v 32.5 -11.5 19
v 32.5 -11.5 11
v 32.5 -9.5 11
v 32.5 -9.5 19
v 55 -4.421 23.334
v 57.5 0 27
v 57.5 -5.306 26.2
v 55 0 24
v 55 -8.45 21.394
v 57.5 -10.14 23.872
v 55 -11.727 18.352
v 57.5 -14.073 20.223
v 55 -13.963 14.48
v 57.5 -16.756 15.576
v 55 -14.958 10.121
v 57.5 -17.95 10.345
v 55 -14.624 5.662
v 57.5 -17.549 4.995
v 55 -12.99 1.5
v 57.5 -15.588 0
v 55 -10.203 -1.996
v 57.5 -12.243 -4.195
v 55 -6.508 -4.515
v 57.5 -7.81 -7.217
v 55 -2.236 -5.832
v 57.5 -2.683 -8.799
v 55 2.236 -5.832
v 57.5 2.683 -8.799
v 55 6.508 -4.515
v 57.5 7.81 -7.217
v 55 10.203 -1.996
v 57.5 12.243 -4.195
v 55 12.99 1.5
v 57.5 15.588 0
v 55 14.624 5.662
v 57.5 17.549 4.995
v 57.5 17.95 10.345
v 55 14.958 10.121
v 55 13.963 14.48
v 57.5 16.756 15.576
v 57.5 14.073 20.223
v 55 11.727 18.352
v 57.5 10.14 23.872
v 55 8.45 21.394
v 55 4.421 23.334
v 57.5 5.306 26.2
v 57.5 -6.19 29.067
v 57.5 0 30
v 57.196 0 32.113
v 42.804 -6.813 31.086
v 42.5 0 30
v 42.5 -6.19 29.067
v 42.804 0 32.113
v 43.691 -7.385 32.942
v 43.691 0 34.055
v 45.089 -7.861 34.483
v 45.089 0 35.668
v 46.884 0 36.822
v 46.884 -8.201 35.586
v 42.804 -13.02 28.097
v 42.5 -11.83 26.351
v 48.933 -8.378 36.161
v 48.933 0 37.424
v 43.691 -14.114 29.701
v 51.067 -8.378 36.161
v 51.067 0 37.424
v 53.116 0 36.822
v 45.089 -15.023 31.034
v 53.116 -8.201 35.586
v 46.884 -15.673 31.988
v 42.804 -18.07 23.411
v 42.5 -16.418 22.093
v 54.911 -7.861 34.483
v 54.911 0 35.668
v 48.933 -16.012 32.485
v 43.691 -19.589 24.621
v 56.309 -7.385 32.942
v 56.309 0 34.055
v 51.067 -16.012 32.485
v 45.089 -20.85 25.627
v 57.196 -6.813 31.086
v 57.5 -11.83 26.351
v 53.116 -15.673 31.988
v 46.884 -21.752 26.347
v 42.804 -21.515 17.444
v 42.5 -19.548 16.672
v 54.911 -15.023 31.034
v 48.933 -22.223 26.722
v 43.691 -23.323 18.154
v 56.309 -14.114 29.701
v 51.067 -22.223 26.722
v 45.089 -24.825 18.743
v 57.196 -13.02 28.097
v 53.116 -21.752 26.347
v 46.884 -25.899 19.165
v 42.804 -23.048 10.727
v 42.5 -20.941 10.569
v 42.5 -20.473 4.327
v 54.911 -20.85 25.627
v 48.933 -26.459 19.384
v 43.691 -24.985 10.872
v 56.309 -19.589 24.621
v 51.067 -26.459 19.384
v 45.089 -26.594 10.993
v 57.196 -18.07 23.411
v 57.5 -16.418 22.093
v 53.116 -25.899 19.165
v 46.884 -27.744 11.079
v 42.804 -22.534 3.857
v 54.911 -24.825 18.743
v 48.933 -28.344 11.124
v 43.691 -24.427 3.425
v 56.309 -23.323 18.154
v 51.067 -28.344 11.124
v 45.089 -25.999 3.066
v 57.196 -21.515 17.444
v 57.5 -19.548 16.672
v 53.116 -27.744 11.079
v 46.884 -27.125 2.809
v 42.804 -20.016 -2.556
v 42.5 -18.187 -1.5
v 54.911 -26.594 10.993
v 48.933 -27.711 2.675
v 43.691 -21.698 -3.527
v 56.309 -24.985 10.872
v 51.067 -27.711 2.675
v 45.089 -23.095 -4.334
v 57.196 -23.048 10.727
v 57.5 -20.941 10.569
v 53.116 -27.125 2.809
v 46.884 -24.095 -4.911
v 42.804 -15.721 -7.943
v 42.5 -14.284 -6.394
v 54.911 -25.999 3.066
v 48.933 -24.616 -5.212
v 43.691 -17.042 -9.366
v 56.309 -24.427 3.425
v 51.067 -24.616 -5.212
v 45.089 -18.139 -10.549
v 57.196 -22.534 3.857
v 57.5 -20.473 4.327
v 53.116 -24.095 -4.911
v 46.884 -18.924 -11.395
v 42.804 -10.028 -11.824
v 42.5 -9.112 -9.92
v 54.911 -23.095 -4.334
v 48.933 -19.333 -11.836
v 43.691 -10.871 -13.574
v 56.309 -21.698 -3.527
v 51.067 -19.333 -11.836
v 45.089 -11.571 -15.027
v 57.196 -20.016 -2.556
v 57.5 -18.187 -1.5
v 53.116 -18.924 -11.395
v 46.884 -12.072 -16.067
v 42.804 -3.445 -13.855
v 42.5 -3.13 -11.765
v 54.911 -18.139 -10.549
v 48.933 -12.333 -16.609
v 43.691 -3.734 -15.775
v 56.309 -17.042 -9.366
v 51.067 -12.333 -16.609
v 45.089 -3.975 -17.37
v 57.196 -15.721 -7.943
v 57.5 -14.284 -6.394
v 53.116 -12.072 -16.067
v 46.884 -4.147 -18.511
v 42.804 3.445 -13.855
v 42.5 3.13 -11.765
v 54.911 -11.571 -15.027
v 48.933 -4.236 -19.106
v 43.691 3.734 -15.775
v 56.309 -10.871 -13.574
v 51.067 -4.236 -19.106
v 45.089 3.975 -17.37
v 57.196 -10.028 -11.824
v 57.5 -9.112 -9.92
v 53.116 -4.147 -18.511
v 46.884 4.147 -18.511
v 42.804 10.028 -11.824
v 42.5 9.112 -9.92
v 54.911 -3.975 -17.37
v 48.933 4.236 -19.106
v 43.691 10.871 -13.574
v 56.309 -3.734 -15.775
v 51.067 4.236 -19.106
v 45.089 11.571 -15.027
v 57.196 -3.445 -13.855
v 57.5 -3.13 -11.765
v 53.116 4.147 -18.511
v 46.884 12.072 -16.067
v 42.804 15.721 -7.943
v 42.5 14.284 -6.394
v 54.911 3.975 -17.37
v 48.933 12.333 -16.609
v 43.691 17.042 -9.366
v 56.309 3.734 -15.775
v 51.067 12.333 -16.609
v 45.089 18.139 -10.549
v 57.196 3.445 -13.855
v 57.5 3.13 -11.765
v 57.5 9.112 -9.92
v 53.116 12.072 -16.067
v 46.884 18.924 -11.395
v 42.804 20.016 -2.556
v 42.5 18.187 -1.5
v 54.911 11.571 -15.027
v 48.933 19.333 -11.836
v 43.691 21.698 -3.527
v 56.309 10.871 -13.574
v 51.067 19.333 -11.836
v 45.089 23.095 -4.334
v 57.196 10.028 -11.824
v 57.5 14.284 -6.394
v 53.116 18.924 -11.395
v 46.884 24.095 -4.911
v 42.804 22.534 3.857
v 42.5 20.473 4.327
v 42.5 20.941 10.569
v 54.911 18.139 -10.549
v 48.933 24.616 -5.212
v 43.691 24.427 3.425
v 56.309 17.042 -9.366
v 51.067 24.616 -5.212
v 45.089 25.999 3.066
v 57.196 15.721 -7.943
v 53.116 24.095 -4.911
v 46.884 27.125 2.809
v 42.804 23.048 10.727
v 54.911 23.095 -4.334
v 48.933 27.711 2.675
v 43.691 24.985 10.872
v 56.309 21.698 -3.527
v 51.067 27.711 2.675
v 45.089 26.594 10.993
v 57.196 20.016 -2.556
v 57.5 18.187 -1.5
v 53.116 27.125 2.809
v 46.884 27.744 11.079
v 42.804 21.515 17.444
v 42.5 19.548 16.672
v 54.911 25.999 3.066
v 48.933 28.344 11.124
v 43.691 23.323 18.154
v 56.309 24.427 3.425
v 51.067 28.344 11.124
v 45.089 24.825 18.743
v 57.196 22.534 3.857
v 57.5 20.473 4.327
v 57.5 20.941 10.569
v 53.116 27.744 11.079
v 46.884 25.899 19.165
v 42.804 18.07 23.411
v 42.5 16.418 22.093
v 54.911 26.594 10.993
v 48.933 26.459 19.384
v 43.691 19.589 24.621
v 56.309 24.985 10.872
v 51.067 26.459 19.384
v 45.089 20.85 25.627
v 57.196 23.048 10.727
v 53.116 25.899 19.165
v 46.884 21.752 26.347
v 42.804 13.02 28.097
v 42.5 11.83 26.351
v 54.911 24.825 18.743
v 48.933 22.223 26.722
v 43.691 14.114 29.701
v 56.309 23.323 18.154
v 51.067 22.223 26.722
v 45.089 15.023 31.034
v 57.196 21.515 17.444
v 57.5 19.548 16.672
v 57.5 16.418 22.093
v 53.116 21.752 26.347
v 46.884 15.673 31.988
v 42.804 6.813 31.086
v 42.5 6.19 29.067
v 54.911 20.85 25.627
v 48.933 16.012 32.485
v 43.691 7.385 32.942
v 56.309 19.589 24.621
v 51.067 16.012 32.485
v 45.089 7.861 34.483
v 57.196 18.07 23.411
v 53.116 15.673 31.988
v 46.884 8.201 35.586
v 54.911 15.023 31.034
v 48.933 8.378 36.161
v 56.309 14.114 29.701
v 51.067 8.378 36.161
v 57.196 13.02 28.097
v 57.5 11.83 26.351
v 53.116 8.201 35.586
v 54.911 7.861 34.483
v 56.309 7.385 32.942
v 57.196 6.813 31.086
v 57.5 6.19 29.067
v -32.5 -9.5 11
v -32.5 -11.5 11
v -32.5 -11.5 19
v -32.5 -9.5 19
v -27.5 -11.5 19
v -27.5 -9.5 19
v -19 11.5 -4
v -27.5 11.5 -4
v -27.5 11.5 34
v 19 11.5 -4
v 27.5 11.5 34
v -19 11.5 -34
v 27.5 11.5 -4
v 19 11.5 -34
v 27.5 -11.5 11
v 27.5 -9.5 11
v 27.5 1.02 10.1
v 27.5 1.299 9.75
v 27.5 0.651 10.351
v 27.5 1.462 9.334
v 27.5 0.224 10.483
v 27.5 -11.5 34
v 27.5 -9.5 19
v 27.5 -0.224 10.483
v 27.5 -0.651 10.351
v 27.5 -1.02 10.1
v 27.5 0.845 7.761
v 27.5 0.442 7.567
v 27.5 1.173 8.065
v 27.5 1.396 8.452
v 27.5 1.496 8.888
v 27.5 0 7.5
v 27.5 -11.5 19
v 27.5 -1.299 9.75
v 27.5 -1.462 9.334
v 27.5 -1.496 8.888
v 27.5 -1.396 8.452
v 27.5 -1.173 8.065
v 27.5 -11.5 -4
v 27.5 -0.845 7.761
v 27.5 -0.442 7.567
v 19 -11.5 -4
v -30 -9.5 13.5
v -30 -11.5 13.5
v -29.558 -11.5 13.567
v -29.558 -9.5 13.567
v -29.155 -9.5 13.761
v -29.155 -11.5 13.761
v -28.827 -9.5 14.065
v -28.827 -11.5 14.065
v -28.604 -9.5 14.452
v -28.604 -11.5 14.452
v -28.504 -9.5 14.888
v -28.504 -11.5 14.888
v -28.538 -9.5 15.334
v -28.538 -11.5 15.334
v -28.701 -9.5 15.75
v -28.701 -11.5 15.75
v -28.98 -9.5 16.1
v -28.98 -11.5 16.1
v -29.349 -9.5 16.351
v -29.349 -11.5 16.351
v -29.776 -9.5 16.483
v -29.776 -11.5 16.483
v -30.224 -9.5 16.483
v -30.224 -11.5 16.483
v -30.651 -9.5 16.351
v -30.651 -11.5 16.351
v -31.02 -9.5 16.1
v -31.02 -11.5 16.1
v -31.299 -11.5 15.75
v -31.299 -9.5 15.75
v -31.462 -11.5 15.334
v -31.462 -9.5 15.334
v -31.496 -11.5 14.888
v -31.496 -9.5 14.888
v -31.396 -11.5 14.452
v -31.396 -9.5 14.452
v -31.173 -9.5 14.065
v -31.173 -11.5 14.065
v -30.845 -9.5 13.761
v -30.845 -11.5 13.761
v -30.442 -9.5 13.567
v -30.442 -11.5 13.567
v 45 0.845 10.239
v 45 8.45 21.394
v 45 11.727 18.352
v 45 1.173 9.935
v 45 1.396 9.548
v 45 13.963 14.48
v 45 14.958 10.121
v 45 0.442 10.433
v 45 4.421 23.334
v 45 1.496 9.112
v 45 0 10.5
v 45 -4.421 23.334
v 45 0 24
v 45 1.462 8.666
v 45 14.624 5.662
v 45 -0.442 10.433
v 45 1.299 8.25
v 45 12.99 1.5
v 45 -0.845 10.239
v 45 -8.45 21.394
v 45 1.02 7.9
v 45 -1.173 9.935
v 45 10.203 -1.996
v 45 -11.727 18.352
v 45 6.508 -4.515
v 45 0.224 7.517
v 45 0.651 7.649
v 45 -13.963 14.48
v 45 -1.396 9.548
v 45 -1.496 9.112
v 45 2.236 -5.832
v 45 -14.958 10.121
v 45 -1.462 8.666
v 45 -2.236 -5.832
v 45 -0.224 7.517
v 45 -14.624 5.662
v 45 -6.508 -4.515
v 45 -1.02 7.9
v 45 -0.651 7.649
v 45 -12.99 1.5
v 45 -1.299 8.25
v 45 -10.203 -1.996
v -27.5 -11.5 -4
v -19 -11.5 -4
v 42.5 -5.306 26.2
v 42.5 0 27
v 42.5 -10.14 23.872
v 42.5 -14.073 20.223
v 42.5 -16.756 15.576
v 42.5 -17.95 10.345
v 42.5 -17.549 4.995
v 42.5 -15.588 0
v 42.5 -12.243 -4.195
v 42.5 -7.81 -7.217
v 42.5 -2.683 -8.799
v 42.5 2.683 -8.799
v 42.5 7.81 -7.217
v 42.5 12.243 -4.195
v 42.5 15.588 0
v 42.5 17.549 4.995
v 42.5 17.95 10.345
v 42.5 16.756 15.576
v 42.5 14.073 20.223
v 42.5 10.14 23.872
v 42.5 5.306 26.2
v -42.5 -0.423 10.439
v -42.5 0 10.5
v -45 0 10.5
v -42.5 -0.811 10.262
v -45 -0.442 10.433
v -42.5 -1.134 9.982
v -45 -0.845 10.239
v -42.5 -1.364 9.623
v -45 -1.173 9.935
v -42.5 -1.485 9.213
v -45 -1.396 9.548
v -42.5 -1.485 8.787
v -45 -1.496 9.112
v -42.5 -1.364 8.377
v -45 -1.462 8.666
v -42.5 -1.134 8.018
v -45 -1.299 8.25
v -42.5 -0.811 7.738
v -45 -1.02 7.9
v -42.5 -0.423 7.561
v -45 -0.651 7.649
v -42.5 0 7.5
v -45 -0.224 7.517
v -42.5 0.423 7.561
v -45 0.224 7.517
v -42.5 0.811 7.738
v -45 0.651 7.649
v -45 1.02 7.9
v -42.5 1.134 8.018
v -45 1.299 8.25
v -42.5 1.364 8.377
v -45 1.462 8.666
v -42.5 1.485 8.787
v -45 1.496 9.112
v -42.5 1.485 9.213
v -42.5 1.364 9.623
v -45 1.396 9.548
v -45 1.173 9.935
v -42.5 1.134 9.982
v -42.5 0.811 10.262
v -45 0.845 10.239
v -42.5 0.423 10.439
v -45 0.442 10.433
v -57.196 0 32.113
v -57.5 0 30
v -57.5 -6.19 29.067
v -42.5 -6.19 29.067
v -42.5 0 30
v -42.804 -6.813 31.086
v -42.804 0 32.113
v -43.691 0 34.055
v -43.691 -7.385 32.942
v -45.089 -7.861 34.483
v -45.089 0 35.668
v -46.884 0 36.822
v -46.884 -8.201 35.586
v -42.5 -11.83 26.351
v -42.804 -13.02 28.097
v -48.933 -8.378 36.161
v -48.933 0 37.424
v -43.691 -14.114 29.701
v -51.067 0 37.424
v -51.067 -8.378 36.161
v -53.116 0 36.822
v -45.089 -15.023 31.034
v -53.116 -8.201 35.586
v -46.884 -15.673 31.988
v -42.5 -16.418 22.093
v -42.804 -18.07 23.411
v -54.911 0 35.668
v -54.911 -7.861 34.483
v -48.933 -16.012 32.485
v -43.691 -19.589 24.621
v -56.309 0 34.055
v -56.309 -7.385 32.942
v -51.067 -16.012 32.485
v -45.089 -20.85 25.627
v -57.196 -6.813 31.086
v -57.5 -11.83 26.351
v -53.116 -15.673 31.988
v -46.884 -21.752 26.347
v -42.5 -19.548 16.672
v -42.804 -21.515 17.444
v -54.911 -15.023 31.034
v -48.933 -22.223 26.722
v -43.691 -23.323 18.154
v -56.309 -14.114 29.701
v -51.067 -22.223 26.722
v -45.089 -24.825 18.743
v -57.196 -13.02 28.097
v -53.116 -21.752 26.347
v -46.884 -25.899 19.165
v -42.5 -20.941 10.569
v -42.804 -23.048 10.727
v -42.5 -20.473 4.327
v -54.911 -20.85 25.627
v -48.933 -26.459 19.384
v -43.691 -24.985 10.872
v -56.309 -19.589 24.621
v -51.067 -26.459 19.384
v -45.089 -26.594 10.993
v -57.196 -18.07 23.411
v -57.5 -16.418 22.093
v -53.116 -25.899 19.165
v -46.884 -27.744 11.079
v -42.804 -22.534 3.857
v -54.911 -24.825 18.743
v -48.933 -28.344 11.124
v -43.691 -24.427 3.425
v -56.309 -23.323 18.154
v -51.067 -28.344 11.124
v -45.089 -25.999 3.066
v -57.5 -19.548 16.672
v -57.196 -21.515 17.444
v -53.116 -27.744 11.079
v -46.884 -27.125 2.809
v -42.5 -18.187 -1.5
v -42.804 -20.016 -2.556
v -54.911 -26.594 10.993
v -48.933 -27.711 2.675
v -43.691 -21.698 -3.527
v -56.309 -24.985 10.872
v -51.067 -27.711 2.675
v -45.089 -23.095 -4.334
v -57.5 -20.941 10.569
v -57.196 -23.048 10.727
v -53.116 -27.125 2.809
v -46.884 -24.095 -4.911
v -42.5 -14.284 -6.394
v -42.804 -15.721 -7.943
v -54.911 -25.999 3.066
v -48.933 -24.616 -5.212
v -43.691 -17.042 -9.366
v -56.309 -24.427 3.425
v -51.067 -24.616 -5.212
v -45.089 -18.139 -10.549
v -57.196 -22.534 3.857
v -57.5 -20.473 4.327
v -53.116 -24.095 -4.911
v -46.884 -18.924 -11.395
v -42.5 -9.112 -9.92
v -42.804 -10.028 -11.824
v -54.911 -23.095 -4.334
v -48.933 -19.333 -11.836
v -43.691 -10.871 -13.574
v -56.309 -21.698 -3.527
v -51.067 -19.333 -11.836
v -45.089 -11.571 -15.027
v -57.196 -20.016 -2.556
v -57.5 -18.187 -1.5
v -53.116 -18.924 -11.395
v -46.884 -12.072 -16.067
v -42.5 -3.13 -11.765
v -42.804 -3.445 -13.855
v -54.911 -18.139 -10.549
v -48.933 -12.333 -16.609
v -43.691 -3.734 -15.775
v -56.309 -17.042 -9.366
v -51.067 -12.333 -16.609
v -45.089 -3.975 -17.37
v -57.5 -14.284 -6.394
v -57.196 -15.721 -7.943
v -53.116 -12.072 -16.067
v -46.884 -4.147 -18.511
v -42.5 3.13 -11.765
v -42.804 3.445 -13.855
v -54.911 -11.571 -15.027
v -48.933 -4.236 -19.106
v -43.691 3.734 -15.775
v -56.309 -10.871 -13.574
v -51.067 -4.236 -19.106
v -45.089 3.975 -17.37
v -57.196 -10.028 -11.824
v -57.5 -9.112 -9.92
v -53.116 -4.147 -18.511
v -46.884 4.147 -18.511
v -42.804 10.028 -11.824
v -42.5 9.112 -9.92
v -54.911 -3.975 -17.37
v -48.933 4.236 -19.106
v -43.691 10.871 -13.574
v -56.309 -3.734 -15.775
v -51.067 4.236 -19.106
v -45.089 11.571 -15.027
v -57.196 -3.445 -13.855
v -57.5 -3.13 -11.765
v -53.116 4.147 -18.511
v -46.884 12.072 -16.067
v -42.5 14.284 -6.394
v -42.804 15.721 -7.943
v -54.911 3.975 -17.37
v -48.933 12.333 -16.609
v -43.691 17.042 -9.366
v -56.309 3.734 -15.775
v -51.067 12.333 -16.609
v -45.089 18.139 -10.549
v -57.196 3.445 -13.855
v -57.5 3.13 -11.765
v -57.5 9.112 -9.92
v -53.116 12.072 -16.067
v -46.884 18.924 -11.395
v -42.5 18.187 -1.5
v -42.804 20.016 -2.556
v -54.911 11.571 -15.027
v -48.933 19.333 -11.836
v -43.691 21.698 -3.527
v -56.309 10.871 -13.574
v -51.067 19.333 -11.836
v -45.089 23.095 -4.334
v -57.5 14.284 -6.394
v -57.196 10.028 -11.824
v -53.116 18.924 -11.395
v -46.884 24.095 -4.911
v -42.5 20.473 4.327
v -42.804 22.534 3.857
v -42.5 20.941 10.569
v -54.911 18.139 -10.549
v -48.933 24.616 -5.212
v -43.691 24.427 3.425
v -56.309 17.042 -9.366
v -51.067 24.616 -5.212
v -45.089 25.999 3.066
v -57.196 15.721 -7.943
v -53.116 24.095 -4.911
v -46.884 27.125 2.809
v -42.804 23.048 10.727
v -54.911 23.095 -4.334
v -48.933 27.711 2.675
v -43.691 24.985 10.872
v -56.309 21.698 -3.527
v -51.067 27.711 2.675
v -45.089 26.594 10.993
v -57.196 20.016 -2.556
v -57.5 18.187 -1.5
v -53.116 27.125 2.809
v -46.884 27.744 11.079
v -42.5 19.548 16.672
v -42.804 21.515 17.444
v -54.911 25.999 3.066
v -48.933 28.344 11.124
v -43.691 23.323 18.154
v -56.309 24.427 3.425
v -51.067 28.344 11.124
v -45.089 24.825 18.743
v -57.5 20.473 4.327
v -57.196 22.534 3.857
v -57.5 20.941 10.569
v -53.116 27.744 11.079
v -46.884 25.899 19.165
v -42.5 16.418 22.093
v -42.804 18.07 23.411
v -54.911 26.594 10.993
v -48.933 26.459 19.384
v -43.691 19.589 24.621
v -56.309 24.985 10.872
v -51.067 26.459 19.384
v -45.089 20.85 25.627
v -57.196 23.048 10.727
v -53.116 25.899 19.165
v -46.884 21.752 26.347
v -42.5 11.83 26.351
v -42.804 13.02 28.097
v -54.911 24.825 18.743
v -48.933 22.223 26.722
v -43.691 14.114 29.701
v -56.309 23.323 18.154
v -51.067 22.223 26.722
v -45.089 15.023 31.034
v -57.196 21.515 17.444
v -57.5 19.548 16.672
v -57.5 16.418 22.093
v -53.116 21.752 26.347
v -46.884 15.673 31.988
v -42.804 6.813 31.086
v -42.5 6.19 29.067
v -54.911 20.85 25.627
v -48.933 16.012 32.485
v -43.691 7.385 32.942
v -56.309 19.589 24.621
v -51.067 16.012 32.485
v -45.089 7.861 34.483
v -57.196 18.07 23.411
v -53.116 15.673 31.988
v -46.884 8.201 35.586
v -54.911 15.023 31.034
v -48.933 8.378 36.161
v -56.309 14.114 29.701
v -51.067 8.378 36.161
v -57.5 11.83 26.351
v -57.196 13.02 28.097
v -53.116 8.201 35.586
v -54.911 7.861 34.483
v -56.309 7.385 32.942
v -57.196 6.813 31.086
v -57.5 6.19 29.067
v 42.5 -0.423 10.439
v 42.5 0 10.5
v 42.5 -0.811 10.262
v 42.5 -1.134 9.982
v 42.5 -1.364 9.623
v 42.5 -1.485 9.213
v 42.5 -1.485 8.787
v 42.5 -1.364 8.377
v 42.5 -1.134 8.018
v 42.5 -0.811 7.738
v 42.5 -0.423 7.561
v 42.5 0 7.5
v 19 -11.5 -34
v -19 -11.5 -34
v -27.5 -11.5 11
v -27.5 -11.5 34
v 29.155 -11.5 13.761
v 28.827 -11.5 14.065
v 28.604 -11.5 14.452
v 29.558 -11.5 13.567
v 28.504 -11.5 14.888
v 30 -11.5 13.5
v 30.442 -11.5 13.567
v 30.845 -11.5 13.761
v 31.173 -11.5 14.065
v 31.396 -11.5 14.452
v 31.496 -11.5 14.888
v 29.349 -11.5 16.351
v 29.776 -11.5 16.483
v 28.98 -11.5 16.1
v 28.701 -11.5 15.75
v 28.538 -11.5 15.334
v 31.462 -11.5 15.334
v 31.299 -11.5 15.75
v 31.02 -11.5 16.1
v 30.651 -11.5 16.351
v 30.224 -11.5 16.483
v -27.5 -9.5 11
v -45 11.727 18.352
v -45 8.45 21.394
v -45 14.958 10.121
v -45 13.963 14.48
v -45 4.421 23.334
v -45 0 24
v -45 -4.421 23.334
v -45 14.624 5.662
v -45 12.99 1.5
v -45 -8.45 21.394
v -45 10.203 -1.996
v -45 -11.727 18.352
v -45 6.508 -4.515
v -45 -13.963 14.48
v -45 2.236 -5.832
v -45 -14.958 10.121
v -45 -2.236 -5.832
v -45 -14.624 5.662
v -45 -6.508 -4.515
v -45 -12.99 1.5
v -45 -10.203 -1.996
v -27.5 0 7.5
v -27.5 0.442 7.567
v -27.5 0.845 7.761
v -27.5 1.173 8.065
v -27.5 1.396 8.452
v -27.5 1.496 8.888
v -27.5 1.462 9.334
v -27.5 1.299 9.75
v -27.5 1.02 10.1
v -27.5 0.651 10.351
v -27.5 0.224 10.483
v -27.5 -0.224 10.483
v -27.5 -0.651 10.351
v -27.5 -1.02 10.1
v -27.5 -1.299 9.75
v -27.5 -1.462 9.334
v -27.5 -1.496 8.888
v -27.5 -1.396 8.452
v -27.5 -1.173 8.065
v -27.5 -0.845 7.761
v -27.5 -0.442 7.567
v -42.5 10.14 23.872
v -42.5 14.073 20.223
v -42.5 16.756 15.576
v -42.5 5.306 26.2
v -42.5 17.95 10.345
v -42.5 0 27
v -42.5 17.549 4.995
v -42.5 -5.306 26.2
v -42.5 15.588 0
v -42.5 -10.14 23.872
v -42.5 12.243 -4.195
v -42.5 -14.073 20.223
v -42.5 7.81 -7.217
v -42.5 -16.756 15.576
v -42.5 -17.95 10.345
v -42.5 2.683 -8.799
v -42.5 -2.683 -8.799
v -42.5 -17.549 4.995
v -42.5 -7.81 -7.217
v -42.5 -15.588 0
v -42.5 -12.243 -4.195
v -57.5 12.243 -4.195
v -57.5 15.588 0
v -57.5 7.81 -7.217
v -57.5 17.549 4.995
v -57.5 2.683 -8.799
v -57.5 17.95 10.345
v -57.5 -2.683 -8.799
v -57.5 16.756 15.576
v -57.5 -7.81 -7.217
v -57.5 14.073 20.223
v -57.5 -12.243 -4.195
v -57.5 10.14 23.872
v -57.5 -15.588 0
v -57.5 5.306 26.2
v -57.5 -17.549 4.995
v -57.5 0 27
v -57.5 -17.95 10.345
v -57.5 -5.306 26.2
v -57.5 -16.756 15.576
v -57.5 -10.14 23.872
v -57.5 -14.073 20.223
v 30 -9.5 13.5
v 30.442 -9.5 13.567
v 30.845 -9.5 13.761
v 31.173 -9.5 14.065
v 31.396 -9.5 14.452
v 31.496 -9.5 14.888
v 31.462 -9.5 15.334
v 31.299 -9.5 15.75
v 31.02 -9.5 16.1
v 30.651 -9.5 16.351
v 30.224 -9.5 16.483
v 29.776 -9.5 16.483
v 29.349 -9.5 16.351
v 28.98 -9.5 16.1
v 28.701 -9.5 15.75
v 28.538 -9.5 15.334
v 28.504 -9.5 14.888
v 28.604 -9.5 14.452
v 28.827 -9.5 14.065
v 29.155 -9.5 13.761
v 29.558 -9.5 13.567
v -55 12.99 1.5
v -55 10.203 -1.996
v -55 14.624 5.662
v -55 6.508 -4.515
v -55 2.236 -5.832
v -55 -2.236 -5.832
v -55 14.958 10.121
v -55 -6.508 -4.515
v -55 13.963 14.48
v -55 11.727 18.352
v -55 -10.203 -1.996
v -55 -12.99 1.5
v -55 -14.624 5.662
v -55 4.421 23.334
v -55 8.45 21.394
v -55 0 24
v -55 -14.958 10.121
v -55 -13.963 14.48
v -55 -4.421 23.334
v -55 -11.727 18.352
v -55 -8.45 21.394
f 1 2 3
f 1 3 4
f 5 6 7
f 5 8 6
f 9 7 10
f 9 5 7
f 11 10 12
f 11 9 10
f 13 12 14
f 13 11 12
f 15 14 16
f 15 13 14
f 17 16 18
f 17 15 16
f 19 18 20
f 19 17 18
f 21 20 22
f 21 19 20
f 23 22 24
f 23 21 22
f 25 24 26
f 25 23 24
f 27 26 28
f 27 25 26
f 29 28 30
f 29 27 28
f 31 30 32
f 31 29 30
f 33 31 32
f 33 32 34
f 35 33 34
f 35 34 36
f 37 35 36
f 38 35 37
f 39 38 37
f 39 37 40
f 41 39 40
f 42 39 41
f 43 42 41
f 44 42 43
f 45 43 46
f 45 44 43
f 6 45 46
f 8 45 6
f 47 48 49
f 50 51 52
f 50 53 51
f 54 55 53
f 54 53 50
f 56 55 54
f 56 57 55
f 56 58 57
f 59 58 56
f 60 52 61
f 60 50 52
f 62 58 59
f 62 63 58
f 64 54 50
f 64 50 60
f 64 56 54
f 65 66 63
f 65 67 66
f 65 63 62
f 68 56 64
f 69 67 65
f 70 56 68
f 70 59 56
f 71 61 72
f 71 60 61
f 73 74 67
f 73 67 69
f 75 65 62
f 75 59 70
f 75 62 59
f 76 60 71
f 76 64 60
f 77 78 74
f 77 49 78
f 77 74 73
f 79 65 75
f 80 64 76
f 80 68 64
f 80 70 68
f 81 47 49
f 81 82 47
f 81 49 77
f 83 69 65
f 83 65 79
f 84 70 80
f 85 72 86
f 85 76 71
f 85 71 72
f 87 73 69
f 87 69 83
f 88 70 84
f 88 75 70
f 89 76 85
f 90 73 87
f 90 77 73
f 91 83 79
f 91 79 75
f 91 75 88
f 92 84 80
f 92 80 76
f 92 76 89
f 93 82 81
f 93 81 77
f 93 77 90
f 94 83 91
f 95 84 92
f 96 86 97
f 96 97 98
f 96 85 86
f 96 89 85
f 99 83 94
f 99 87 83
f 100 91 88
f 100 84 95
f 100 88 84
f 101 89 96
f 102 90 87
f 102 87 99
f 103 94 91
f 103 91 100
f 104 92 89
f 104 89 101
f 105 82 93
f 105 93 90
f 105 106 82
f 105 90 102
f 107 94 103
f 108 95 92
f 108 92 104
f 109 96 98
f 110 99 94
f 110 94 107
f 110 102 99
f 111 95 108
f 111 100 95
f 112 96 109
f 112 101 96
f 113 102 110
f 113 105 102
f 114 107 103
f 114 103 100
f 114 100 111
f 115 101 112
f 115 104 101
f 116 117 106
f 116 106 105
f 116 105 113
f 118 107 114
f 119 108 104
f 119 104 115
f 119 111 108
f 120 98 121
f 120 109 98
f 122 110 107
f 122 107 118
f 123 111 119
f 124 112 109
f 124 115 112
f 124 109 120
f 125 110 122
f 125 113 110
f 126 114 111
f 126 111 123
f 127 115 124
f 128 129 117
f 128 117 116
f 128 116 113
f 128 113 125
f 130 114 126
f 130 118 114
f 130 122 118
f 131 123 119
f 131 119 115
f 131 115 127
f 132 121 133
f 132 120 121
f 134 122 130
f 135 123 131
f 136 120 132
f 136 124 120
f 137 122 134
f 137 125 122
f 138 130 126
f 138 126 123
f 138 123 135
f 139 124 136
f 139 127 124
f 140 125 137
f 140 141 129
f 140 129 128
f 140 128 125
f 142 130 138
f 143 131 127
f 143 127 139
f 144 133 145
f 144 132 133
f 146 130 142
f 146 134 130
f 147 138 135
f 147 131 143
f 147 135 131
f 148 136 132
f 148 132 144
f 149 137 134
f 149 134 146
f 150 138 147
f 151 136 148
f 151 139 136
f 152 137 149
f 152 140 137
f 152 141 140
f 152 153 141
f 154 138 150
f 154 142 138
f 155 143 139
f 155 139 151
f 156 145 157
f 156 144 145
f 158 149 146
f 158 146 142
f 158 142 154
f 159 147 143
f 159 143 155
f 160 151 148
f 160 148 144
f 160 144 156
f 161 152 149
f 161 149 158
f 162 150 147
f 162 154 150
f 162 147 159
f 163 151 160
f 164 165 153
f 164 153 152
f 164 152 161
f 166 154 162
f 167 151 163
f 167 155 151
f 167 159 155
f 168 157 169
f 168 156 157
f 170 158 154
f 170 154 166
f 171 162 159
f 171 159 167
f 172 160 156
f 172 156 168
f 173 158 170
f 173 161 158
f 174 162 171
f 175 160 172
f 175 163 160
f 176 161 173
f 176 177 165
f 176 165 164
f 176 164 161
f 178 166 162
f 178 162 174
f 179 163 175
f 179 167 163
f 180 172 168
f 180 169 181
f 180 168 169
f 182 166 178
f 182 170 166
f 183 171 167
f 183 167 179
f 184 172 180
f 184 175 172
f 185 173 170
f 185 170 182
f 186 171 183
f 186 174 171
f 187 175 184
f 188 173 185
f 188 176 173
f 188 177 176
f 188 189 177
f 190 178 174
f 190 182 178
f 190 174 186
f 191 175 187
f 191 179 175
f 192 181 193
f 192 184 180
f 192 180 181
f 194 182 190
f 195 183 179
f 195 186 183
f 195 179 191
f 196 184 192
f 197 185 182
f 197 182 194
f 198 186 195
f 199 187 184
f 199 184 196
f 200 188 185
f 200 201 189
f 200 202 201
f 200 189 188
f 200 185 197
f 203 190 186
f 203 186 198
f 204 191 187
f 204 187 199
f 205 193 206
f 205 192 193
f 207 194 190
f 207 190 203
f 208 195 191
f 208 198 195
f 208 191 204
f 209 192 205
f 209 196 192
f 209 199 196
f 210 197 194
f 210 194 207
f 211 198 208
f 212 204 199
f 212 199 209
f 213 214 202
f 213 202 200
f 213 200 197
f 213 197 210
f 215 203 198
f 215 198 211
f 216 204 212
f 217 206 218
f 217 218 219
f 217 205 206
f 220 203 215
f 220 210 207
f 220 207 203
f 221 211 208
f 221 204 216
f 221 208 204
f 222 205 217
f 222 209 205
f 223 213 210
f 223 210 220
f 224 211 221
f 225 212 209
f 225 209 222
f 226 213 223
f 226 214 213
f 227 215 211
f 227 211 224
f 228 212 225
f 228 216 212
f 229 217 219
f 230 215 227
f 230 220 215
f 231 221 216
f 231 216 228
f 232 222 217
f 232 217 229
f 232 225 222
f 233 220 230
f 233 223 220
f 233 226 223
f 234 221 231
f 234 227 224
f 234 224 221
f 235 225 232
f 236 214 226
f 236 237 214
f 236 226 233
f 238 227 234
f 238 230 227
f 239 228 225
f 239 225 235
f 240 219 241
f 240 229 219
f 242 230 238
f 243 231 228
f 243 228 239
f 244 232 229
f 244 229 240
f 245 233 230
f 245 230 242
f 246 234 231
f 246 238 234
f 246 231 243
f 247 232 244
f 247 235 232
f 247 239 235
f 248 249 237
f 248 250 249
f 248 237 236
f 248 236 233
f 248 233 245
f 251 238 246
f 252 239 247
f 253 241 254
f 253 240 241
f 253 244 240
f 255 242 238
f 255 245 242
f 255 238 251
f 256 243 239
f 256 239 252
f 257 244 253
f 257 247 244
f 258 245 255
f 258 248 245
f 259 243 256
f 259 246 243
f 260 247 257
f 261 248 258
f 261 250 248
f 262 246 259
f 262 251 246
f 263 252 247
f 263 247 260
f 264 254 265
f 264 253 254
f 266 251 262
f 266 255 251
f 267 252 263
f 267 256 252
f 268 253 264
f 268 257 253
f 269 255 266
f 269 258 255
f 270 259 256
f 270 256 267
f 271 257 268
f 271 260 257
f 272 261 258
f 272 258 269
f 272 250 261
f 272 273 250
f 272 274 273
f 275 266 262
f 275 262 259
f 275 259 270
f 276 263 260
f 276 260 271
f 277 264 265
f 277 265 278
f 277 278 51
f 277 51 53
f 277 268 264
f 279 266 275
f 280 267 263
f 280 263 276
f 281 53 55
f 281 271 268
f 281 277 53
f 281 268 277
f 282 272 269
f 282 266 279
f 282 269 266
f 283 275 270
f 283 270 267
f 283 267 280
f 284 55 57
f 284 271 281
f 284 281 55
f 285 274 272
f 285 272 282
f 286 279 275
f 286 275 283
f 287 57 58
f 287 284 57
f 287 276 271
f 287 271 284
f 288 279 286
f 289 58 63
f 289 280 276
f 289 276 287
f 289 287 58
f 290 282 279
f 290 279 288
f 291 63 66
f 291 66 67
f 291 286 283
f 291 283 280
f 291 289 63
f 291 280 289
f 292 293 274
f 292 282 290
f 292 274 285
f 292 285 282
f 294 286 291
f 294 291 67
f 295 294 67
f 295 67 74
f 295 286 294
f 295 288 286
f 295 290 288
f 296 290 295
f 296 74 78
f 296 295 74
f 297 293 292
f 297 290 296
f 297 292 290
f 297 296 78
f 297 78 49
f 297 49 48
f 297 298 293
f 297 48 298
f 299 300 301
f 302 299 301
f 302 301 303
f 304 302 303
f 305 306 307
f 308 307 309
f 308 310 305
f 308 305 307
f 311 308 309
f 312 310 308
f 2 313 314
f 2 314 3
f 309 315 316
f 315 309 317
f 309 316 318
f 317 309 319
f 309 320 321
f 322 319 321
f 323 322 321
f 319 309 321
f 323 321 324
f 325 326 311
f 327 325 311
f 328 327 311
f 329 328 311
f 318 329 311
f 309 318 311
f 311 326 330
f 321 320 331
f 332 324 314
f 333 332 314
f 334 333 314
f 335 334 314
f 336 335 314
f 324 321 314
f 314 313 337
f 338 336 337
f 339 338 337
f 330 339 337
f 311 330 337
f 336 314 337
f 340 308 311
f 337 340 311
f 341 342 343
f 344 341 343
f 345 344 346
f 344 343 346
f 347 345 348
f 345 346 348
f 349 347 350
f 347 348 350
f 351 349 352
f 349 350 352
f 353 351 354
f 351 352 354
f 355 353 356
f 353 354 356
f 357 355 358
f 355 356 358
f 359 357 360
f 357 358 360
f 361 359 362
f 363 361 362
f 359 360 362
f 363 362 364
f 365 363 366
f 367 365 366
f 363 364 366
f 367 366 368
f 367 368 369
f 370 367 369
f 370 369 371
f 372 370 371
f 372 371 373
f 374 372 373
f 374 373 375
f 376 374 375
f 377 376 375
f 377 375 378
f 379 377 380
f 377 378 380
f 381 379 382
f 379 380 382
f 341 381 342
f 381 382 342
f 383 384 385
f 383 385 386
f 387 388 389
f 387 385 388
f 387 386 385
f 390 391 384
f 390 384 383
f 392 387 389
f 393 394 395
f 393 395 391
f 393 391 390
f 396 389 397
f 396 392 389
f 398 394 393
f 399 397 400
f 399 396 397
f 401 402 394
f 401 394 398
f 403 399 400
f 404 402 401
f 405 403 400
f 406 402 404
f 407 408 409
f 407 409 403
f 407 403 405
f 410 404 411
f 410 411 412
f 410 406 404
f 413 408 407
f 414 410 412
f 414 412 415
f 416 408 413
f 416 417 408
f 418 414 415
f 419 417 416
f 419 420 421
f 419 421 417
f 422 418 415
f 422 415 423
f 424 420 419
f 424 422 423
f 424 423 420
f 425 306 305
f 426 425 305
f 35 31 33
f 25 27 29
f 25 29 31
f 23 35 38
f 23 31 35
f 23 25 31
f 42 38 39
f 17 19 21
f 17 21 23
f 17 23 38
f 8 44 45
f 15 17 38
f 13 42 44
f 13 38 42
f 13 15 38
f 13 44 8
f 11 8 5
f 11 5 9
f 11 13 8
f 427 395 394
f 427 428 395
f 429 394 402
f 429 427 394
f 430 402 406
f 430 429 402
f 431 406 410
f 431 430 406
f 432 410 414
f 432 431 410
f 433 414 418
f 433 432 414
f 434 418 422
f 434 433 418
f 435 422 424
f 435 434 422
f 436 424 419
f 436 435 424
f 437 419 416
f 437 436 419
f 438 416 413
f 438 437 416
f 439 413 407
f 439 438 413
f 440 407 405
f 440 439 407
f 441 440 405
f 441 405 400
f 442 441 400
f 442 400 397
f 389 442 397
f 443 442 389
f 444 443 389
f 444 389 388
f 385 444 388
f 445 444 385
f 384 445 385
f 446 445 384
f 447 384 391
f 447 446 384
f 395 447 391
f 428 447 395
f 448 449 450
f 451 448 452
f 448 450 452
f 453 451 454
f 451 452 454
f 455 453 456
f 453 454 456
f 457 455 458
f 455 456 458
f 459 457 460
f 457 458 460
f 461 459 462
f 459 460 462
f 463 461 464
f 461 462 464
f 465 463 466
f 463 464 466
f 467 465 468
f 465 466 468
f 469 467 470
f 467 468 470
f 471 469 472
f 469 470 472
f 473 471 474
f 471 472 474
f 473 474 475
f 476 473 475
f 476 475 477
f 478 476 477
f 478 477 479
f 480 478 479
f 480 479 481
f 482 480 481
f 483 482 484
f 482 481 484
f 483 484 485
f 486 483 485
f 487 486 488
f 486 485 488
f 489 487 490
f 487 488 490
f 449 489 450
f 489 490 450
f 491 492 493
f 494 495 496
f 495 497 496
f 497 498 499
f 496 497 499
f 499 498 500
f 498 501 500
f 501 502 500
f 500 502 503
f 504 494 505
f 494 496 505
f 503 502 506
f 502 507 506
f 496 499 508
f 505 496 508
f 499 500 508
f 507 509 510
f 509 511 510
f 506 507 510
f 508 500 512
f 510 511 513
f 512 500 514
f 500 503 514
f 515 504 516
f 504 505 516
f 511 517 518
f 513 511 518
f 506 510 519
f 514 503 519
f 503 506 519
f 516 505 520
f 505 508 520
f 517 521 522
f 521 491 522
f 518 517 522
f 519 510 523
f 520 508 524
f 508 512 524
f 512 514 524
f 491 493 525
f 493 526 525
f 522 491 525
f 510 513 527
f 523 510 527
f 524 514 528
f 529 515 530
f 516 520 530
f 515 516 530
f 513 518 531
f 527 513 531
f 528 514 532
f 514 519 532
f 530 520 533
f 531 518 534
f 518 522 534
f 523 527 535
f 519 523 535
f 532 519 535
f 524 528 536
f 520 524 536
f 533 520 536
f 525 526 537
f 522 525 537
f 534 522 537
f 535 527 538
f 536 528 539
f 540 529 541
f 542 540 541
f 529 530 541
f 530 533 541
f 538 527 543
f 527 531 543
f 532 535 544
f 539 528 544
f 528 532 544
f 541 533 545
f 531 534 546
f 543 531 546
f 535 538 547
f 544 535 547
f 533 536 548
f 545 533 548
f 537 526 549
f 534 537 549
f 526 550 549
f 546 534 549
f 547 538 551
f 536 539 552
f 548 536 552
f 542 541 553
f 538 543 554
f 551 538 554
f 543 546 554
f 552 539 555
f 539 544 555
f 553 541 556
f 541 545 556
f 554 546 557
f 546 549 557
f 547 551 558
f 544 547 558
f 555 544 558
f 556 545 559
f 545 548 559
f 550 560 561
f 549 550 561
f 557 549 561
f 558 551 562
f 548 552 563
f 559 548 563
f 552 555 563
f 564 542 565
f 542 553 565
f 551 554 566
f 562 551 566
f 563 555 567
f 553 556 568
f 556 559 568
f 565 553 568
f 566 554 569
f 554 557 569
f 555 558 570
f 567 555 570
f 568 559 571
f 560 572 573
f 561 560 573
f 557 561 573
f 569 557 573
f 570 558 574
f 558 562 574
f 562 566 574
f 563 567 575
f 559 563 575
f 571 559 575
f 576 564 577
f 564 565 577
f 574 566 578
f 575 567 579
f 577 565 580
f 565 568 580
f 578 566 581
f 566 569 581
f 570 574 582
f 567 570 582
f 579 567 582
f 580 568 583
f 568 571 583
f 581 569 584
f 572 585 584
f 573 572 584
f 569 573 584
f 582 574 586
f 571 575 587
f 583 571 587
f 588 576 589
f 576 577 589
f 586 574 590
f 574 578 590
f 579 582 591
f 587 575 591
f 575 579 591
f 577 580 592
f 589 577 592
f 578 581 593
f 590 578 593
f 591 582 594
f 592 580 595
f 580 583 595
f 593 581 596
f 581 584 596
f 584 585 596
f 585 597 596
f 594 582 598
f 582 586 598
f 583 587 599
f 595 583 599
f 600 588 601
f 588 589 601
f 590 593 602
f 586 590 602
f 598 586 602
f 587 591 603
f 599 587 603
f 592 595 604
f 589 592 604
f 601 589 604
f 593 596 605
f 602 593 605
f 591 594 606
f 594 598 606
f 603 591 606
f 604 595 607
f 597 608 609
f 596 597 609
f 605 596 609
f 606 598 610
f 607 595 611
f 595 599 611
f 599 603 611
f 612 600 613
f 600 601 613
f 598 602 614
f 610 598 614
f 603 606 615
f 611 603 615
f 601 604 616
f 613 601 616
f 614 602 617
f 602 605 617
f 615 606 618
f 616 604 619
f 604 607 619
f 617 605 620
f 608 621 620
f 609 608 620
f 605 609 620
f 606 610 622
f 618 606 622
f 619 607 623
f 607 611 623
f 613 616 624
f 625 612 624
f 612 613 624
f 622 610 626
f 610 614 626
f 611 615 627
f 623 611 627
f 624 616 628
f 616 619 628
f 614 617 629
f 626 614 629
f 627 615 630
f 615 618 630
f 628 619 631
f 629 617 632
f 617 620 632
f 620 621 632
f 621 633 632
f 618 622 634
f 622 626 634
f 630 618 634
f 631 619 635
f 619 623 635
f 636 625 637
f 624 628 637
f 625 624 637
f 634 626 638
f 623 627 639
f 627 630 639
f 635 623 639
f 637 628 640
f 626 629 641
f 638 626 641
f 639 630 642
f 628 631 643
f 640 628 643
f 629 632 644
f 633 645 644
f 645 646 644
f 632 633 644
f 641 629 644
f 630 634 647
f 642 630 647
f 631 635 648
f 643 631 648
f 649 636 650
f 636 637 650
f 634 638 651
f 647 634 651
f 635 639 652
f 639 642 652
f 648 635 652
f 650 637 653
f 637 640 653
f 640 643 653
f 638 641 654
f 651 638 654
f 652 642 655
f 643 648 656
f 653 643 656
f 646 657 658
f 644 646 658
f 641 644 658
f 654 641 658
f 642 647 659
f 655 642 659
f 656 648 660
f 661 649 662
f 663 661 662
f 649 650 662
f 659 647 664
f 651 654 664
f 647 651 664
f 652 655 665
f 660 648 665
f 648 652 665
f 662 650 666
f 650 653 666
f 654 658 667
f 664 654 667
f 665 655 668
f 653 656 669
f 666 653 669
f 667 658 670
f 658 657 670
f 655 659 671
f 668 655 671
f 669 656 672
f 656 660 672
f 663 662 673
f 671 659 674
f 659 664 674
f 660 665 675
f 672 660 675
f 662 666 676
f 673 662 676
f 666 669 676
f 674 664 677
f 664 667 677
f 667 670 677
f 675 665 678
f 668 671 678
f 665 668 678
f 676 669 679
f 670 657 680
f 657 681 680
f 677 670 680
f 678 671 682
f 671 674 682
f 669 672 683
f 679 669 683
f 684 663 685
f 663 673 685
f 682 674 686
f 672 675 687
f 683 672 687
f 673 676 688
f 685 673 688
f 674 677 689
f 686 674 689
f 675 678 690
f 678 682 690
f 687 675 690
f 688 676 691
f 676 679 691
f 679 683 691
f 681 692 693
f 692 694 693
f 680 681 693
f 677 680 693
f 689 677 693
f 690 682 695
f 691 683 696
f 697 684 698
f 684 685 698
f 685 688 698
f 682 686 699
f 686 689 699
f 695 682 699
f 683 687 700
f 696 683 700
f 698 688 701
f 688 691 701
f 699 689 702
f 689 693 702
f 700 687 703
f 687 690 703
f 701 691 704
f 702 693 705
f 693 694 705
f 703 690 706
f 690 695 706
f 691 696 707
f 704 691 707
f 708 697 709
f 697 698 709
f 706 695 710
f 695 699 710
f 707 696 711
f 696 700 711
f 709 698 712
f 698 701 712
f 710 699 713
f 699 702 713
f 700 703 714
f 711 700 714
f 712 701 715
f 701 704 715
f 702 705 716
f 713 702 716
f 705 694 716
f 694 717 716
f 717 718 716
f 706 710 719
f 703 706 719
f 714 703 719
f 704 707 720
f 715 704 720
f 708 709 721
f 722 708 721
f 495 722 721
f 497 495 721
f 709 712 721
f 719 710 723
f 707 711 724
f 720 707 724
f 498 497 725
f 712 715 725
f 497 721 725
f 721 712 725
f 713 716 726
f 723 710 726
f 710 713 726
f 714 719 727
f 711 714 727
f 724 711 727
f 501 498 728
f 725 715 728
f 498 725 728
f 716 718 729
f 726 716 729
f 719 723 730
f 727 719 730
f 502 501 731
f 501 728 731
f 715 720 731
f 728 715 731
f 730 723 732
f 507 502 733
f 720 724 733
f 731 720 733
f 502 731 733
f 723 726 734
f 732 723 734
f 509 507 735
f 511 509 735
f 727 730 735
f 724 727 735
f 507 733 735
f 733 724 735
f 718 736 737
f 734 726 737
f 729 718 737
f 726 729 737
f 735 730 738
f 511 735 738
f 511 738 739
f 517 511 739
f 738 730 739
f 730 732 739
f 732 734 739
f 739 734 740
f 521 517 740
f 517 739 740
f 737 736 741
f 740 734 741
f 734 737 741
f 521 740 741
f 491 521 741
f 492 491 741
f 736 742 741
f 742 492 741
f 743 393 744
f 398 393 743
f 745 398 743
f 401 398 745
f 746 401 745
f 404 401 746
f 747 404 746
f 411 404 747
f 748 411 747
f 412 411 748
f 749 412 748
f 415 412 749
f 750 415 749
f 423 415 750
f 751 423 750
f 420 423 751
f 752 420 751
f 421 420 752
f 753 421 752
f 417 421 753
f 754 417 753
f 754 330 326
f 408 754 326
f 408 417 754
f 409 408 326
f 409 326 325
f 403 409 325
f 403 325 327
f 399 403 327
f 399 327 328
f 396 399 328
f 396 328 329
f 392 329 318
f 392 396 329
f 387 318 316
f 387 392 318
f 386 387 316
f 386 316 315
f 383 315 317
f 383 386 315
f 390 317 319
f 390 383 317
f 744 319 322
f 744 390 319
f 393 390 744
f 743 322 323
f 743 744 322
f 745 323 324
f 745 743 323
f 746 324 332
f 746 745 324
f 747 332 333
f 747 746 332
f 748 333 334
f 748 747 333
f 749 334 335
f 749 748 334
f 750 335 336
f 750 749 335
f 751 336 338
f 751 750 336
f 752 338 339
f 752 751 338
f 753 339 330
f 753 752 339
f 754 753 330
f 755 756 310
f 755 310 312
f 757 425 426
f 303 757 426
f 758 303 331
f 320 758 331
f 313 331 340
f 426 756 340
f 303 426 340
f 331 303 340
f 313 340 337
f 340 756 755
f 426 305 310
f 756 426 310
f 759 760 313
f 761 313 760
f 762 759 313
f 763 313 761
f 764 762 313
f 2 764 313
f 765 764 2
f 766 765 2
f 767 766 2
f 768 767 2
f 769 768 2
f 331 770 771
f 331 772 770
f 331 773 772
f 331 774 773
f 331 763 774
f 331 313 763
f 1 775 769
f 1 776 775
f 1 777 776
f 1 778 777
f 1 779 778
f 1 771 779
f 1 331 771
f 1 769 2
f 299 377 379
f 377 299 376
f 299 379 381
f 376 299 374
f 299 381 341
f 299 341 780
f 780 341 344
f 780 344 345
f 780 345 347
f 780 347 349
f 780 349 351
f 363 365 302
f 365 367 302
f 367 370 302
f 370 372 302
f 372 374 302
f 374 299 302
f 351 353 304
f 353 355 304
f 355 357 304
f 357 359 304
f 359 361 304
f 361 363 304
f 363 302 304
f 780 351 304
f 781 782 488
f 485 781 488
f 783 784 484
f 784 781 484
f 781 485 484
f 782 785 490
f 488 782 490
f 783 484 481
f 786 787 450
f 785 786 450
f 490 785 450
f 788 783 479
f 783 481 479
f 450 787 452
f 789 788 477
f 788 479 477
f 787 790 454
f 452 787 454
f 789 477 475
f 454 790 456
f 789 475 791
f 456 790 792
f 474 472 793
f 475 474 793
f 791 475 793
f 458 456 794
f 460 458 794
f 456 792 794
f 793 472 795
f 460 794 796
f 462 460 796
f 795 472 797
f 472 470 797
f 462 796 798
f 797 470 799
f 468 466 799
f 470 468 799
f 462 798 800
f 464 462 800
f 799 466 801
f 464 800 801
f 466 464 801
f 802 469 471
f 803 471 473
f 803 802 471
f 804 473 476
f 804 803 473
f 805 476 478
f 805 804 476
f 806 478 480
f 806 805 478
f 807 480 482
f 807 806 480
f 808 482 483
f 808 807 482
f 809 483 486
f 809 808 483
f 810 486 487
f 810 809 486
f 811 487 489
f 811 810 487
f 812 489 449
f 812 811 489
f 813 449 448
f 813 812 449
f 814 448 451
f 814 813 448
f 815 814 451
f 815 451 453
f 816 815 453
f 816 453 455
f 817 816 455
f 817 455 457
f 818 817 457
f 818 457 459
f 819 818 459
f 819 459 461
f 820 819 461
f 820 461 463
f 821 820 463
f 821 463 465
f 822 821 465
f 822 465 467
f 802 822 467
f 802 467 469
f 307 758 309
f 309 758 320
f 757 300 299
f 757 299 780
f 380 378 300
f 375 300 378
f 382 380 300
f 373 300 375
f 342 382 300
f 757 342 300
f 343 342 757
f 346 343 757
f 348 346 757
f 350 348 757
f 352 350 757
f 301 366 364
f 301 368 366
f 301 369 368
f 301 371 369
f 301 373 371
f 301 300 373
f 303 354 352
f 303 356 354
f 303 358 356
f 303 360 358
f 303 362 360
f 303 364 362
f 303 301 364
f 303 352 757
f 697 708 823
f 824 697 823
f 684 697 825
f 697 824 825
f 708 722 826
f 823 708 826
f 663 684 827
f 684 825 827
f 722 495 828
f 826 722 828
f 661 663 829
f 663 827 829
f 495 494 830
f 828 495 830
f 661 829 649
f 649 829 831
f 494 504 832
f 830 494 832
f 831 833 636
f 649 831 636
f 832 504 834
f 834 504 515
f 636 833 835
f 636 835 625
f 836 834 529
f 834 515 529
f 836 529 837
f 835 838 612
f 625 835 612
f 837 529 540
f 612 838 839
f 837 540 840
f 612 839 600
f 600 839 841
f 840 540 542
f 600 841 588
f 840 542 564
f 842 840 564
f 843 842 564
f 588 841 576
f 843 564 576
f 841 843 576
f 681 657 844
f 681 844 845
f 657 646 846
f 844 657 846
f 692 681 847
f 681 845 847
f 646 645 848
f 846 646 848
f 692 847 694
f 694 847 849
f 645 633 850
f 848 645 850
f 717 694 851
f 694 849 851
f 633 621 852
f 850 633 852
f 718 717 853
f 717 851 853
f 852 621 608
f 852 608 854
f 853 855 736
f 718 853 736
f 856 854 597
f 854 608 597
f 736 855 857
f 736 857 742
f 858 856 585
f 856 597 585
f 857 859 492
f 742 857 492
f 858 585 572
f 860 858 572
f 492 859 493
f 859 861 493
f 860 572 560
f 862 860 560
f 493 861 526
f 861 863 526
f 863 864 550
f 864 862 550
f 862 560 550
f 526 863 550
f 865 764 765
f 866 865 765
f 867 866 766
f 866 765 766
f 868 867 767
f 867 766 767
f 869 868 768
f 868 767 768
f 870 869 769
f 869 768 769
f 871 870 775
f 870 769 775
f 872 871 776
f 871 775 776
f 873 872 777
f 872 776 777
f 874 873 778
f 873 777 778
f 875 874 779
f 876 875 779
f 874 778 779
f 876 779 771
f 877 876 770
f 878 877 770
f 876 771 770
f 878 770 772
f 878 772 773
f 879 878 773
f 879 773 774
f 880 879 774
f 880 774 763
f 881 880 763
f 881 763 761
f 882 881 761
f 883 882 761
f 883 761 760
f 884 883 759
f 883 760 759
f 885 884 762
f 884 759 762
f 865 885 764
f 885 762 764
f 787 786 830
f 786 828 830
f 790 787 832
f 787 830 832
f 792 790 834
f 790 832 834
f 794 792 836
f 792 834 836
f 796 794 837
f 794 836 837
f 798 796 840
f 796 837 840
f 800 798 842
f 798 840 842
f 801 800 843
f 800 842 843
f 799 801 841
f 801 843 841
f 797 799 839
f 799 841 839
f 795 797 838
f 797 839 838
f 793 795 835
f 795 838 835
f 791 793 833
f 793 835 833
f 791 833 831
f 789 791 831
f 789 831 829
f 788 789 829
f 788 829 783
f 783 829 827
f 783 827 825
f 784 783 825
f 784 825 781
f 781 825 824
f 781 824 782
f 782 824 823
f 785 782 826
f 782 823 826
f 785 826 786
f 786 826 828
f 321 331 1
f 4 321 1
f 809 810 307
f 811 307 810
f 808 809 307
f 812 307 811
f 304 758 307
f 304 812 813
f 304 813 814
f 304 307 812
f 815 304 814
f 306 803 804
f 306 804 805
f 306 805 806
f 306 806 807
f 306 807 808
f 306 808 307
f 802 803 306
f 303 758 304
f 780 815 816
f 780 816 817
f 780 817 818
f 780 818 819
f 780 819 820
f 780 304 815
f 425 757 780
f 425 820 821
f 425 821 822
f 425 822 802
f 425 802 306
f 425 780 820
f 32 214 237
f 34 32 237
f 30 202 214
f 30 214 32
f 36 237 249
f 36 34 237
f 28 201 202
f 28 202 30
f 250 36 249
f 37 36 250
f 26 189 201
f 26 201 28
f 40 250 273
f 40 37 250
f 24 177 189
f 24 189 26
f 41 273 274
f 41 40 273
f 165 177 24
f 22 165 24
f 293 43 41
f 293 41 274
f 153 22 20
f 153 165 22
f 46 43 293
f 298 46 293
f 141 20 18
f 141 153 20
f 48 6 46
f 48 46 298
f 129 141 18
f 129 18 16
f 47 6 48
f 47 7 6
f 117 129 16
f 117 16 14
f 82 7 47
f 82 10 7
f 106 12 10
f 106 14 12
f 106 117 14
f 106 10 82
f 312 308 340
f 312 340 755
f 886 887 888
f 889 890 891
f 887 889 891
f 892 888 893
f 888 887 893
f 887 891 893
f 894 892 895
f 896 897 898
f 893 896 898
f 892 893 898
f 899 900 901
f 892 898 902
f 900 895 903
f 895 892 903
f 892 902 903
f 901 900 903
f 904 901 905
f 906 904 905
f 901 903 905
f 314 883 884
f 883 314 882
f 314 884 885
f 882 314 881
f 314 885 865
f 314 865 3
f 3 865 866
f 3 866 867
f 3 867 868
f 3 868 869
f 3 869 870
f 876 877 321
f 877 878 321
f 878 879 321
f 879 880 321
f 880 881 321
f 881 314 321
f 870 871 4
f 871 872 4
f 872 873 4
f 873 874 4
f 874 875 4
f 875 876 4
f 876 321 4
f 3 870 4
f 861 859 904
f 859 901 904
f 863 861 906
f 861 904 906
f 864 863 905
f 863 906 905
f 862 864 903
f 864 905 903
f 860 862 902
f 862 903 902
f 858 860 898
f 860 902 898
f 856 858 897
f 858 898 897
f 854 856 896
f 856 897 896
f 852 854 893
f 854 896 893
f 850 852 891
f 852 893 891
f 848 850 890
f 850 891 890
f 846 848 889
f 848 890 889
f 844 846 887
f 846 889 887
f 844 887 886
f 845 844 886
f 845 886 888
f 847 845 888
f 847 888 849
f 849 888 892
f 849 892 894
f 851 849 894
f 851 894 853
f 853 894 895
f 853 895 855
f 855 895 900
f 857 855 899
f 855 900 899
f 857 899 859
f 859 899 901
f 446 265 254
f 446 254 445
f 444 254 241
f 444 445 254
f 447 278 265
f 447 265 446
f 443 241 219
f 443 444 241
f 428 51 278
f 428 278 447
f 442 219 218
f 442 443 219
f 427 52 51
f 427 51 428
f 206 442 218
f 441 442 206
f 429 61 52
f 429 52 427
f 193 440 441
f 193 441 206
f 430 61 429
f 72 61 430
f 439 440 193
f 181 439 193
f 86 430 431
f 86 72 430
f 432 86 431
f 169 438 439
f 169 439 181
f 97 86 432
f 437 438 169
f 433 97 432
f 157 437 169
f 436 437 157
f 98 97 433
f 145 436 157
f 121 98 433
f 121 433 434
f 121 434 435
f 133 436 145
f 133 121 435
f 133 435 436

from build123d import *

# Parameters (mm, degrees)
BOSS_EXTRUDE1_DEPTH      = 11.5
BOSS_EXTRUDE1_DEPTH_BACK = 11.5
SKETCH1_W                = 55
SKETCH1_H                = 68
SKETCH2_R                = 1.5
BOSS_EXTRUDE2_DEPTH      = 15
SKETCH7_W                = 8.5
SKETCH7_H                = 30
CUT_EXTRUDE1_DEPTH       = 80.451243008
SKETCH8_W                = 5
SKETCH8_H                = 8
SKETCH8_R                = 1.5
BOSS_EXTRUDE3_DEPTH      = 2


with BuildPart() as part:
    # Sketch1 → Boss-Extrude1 (new, two sides: drawn at the far end of the back side and taken through both)
    with BuildSketch(Plane(origin=(0, 0, 0), x_dir=(1, 0, 0), z_dir=(0, 1, 0)).offset(-BOSS_EXTRUDE1_DEPTH_BACK)):
        Rectangle(SKETCH1_W, SKETCH1_H)
    extrude(amount=BOSS_EXTRUDE1_DEPTH + BOSS_EXTRUDE1_DEPTH_BACK)

    # Sketch2 → Boss-Extrude2 (add)
    with BuildSketch(Plane(origin=(27.5, 0, 0), x_dir=(0, 0, -1), z_dir=(1, 0, 0))):
        with Locations((-9, 0)):
            Circle(SKETCH2_R)
    boss_extrude2 = extrude(amount=BOSS_EXTRUDE2_DEPTH)

    # Sketch6 → Revolve1 (revolve)
    with BuildSketch(Plane(origin=(0, 0, 0), x_dir=(1, 0, 0), z_dir=(0, 1, 0))):
        with BuildLine():
            Line((42.5, -7.5), (45, -7.5))
            Line((45, -7.5), (45, 6))
            Line((45, 6), (42.5, 9))
            Line((42.5, 9), (42.5, 12))
            ThreePointArc((42.5, 12), (50, 19.5), (57.5, 12))
            Line((57.5, 12), (57.5, 9))
            Line((57.5, 9), (55, 6))
            Line((55, 6), (55, -9))
            Line((55, -9), (42.5, -9))
            Line((42.5, -9), (42.5, -7.5))
        make_face()
    revolve1 = revolve(axis=Axis((42.5, 0, 9), (1, 0, 0)))

    # Mirror1: Boss-Extrude2, Revolve1 across plane
    add(boss_extrude2.mirror(Plane(origin=(0, 0, 0), x_dir=(0, 0, 1), z_dir=(1, 0, 0))))
    add(revolve1.mirror(Plane(origin=(0, 0, 0), x_dir=(0, 0, 1), z_dir=(1, 0, 0))))

    # Sketch7 → Cut-Extrude1 (cut, through all)
    with BuildSketch(Plane(origin=(0, 11.5, 0), x_dir=(1, 0, 0), z_dir=(0, 1, 0))):
        with Locations((-23.25, 19)):
            Rectangle(SKETCH7_W, SKETCH7_H)
        with Locations((23.25, 19)):
            Rectangle(SKETCH7_W, SKETCH7_H)
    extrude(amount=-CUT_EXTRUDE1_DEPTH, mode=Mode.SUBTRACT)

    # Sketch8 → Boss-Extrude3 (add)
    # profile 1 of 2: a face of its own
    with BuildSketch(Plane.XZ.offset(11.5)):
        with Locations((-30, 15)):
            Rectangle(SKETCH8_W, SKETCH8_H)
        with Locations((-30, 15)):
            Circle(SKETCH8_R, mode=Mode.SUBTRACT)
    # profile 2 of 2: a face of its own
    with BuildSketch(Plane.XZ.offset(11.5)):
        with Locations((30, 15)):
            Rectangle(SKETCH8_W, SKETCH8_H)
        with Locations((30, 15)):
            Circle(SKETCH8_R, mode=Mode.SUBTRACT)
    extrude(amount=-BOSS_EXTRUDE3_DEPTH)


solid = part.part
